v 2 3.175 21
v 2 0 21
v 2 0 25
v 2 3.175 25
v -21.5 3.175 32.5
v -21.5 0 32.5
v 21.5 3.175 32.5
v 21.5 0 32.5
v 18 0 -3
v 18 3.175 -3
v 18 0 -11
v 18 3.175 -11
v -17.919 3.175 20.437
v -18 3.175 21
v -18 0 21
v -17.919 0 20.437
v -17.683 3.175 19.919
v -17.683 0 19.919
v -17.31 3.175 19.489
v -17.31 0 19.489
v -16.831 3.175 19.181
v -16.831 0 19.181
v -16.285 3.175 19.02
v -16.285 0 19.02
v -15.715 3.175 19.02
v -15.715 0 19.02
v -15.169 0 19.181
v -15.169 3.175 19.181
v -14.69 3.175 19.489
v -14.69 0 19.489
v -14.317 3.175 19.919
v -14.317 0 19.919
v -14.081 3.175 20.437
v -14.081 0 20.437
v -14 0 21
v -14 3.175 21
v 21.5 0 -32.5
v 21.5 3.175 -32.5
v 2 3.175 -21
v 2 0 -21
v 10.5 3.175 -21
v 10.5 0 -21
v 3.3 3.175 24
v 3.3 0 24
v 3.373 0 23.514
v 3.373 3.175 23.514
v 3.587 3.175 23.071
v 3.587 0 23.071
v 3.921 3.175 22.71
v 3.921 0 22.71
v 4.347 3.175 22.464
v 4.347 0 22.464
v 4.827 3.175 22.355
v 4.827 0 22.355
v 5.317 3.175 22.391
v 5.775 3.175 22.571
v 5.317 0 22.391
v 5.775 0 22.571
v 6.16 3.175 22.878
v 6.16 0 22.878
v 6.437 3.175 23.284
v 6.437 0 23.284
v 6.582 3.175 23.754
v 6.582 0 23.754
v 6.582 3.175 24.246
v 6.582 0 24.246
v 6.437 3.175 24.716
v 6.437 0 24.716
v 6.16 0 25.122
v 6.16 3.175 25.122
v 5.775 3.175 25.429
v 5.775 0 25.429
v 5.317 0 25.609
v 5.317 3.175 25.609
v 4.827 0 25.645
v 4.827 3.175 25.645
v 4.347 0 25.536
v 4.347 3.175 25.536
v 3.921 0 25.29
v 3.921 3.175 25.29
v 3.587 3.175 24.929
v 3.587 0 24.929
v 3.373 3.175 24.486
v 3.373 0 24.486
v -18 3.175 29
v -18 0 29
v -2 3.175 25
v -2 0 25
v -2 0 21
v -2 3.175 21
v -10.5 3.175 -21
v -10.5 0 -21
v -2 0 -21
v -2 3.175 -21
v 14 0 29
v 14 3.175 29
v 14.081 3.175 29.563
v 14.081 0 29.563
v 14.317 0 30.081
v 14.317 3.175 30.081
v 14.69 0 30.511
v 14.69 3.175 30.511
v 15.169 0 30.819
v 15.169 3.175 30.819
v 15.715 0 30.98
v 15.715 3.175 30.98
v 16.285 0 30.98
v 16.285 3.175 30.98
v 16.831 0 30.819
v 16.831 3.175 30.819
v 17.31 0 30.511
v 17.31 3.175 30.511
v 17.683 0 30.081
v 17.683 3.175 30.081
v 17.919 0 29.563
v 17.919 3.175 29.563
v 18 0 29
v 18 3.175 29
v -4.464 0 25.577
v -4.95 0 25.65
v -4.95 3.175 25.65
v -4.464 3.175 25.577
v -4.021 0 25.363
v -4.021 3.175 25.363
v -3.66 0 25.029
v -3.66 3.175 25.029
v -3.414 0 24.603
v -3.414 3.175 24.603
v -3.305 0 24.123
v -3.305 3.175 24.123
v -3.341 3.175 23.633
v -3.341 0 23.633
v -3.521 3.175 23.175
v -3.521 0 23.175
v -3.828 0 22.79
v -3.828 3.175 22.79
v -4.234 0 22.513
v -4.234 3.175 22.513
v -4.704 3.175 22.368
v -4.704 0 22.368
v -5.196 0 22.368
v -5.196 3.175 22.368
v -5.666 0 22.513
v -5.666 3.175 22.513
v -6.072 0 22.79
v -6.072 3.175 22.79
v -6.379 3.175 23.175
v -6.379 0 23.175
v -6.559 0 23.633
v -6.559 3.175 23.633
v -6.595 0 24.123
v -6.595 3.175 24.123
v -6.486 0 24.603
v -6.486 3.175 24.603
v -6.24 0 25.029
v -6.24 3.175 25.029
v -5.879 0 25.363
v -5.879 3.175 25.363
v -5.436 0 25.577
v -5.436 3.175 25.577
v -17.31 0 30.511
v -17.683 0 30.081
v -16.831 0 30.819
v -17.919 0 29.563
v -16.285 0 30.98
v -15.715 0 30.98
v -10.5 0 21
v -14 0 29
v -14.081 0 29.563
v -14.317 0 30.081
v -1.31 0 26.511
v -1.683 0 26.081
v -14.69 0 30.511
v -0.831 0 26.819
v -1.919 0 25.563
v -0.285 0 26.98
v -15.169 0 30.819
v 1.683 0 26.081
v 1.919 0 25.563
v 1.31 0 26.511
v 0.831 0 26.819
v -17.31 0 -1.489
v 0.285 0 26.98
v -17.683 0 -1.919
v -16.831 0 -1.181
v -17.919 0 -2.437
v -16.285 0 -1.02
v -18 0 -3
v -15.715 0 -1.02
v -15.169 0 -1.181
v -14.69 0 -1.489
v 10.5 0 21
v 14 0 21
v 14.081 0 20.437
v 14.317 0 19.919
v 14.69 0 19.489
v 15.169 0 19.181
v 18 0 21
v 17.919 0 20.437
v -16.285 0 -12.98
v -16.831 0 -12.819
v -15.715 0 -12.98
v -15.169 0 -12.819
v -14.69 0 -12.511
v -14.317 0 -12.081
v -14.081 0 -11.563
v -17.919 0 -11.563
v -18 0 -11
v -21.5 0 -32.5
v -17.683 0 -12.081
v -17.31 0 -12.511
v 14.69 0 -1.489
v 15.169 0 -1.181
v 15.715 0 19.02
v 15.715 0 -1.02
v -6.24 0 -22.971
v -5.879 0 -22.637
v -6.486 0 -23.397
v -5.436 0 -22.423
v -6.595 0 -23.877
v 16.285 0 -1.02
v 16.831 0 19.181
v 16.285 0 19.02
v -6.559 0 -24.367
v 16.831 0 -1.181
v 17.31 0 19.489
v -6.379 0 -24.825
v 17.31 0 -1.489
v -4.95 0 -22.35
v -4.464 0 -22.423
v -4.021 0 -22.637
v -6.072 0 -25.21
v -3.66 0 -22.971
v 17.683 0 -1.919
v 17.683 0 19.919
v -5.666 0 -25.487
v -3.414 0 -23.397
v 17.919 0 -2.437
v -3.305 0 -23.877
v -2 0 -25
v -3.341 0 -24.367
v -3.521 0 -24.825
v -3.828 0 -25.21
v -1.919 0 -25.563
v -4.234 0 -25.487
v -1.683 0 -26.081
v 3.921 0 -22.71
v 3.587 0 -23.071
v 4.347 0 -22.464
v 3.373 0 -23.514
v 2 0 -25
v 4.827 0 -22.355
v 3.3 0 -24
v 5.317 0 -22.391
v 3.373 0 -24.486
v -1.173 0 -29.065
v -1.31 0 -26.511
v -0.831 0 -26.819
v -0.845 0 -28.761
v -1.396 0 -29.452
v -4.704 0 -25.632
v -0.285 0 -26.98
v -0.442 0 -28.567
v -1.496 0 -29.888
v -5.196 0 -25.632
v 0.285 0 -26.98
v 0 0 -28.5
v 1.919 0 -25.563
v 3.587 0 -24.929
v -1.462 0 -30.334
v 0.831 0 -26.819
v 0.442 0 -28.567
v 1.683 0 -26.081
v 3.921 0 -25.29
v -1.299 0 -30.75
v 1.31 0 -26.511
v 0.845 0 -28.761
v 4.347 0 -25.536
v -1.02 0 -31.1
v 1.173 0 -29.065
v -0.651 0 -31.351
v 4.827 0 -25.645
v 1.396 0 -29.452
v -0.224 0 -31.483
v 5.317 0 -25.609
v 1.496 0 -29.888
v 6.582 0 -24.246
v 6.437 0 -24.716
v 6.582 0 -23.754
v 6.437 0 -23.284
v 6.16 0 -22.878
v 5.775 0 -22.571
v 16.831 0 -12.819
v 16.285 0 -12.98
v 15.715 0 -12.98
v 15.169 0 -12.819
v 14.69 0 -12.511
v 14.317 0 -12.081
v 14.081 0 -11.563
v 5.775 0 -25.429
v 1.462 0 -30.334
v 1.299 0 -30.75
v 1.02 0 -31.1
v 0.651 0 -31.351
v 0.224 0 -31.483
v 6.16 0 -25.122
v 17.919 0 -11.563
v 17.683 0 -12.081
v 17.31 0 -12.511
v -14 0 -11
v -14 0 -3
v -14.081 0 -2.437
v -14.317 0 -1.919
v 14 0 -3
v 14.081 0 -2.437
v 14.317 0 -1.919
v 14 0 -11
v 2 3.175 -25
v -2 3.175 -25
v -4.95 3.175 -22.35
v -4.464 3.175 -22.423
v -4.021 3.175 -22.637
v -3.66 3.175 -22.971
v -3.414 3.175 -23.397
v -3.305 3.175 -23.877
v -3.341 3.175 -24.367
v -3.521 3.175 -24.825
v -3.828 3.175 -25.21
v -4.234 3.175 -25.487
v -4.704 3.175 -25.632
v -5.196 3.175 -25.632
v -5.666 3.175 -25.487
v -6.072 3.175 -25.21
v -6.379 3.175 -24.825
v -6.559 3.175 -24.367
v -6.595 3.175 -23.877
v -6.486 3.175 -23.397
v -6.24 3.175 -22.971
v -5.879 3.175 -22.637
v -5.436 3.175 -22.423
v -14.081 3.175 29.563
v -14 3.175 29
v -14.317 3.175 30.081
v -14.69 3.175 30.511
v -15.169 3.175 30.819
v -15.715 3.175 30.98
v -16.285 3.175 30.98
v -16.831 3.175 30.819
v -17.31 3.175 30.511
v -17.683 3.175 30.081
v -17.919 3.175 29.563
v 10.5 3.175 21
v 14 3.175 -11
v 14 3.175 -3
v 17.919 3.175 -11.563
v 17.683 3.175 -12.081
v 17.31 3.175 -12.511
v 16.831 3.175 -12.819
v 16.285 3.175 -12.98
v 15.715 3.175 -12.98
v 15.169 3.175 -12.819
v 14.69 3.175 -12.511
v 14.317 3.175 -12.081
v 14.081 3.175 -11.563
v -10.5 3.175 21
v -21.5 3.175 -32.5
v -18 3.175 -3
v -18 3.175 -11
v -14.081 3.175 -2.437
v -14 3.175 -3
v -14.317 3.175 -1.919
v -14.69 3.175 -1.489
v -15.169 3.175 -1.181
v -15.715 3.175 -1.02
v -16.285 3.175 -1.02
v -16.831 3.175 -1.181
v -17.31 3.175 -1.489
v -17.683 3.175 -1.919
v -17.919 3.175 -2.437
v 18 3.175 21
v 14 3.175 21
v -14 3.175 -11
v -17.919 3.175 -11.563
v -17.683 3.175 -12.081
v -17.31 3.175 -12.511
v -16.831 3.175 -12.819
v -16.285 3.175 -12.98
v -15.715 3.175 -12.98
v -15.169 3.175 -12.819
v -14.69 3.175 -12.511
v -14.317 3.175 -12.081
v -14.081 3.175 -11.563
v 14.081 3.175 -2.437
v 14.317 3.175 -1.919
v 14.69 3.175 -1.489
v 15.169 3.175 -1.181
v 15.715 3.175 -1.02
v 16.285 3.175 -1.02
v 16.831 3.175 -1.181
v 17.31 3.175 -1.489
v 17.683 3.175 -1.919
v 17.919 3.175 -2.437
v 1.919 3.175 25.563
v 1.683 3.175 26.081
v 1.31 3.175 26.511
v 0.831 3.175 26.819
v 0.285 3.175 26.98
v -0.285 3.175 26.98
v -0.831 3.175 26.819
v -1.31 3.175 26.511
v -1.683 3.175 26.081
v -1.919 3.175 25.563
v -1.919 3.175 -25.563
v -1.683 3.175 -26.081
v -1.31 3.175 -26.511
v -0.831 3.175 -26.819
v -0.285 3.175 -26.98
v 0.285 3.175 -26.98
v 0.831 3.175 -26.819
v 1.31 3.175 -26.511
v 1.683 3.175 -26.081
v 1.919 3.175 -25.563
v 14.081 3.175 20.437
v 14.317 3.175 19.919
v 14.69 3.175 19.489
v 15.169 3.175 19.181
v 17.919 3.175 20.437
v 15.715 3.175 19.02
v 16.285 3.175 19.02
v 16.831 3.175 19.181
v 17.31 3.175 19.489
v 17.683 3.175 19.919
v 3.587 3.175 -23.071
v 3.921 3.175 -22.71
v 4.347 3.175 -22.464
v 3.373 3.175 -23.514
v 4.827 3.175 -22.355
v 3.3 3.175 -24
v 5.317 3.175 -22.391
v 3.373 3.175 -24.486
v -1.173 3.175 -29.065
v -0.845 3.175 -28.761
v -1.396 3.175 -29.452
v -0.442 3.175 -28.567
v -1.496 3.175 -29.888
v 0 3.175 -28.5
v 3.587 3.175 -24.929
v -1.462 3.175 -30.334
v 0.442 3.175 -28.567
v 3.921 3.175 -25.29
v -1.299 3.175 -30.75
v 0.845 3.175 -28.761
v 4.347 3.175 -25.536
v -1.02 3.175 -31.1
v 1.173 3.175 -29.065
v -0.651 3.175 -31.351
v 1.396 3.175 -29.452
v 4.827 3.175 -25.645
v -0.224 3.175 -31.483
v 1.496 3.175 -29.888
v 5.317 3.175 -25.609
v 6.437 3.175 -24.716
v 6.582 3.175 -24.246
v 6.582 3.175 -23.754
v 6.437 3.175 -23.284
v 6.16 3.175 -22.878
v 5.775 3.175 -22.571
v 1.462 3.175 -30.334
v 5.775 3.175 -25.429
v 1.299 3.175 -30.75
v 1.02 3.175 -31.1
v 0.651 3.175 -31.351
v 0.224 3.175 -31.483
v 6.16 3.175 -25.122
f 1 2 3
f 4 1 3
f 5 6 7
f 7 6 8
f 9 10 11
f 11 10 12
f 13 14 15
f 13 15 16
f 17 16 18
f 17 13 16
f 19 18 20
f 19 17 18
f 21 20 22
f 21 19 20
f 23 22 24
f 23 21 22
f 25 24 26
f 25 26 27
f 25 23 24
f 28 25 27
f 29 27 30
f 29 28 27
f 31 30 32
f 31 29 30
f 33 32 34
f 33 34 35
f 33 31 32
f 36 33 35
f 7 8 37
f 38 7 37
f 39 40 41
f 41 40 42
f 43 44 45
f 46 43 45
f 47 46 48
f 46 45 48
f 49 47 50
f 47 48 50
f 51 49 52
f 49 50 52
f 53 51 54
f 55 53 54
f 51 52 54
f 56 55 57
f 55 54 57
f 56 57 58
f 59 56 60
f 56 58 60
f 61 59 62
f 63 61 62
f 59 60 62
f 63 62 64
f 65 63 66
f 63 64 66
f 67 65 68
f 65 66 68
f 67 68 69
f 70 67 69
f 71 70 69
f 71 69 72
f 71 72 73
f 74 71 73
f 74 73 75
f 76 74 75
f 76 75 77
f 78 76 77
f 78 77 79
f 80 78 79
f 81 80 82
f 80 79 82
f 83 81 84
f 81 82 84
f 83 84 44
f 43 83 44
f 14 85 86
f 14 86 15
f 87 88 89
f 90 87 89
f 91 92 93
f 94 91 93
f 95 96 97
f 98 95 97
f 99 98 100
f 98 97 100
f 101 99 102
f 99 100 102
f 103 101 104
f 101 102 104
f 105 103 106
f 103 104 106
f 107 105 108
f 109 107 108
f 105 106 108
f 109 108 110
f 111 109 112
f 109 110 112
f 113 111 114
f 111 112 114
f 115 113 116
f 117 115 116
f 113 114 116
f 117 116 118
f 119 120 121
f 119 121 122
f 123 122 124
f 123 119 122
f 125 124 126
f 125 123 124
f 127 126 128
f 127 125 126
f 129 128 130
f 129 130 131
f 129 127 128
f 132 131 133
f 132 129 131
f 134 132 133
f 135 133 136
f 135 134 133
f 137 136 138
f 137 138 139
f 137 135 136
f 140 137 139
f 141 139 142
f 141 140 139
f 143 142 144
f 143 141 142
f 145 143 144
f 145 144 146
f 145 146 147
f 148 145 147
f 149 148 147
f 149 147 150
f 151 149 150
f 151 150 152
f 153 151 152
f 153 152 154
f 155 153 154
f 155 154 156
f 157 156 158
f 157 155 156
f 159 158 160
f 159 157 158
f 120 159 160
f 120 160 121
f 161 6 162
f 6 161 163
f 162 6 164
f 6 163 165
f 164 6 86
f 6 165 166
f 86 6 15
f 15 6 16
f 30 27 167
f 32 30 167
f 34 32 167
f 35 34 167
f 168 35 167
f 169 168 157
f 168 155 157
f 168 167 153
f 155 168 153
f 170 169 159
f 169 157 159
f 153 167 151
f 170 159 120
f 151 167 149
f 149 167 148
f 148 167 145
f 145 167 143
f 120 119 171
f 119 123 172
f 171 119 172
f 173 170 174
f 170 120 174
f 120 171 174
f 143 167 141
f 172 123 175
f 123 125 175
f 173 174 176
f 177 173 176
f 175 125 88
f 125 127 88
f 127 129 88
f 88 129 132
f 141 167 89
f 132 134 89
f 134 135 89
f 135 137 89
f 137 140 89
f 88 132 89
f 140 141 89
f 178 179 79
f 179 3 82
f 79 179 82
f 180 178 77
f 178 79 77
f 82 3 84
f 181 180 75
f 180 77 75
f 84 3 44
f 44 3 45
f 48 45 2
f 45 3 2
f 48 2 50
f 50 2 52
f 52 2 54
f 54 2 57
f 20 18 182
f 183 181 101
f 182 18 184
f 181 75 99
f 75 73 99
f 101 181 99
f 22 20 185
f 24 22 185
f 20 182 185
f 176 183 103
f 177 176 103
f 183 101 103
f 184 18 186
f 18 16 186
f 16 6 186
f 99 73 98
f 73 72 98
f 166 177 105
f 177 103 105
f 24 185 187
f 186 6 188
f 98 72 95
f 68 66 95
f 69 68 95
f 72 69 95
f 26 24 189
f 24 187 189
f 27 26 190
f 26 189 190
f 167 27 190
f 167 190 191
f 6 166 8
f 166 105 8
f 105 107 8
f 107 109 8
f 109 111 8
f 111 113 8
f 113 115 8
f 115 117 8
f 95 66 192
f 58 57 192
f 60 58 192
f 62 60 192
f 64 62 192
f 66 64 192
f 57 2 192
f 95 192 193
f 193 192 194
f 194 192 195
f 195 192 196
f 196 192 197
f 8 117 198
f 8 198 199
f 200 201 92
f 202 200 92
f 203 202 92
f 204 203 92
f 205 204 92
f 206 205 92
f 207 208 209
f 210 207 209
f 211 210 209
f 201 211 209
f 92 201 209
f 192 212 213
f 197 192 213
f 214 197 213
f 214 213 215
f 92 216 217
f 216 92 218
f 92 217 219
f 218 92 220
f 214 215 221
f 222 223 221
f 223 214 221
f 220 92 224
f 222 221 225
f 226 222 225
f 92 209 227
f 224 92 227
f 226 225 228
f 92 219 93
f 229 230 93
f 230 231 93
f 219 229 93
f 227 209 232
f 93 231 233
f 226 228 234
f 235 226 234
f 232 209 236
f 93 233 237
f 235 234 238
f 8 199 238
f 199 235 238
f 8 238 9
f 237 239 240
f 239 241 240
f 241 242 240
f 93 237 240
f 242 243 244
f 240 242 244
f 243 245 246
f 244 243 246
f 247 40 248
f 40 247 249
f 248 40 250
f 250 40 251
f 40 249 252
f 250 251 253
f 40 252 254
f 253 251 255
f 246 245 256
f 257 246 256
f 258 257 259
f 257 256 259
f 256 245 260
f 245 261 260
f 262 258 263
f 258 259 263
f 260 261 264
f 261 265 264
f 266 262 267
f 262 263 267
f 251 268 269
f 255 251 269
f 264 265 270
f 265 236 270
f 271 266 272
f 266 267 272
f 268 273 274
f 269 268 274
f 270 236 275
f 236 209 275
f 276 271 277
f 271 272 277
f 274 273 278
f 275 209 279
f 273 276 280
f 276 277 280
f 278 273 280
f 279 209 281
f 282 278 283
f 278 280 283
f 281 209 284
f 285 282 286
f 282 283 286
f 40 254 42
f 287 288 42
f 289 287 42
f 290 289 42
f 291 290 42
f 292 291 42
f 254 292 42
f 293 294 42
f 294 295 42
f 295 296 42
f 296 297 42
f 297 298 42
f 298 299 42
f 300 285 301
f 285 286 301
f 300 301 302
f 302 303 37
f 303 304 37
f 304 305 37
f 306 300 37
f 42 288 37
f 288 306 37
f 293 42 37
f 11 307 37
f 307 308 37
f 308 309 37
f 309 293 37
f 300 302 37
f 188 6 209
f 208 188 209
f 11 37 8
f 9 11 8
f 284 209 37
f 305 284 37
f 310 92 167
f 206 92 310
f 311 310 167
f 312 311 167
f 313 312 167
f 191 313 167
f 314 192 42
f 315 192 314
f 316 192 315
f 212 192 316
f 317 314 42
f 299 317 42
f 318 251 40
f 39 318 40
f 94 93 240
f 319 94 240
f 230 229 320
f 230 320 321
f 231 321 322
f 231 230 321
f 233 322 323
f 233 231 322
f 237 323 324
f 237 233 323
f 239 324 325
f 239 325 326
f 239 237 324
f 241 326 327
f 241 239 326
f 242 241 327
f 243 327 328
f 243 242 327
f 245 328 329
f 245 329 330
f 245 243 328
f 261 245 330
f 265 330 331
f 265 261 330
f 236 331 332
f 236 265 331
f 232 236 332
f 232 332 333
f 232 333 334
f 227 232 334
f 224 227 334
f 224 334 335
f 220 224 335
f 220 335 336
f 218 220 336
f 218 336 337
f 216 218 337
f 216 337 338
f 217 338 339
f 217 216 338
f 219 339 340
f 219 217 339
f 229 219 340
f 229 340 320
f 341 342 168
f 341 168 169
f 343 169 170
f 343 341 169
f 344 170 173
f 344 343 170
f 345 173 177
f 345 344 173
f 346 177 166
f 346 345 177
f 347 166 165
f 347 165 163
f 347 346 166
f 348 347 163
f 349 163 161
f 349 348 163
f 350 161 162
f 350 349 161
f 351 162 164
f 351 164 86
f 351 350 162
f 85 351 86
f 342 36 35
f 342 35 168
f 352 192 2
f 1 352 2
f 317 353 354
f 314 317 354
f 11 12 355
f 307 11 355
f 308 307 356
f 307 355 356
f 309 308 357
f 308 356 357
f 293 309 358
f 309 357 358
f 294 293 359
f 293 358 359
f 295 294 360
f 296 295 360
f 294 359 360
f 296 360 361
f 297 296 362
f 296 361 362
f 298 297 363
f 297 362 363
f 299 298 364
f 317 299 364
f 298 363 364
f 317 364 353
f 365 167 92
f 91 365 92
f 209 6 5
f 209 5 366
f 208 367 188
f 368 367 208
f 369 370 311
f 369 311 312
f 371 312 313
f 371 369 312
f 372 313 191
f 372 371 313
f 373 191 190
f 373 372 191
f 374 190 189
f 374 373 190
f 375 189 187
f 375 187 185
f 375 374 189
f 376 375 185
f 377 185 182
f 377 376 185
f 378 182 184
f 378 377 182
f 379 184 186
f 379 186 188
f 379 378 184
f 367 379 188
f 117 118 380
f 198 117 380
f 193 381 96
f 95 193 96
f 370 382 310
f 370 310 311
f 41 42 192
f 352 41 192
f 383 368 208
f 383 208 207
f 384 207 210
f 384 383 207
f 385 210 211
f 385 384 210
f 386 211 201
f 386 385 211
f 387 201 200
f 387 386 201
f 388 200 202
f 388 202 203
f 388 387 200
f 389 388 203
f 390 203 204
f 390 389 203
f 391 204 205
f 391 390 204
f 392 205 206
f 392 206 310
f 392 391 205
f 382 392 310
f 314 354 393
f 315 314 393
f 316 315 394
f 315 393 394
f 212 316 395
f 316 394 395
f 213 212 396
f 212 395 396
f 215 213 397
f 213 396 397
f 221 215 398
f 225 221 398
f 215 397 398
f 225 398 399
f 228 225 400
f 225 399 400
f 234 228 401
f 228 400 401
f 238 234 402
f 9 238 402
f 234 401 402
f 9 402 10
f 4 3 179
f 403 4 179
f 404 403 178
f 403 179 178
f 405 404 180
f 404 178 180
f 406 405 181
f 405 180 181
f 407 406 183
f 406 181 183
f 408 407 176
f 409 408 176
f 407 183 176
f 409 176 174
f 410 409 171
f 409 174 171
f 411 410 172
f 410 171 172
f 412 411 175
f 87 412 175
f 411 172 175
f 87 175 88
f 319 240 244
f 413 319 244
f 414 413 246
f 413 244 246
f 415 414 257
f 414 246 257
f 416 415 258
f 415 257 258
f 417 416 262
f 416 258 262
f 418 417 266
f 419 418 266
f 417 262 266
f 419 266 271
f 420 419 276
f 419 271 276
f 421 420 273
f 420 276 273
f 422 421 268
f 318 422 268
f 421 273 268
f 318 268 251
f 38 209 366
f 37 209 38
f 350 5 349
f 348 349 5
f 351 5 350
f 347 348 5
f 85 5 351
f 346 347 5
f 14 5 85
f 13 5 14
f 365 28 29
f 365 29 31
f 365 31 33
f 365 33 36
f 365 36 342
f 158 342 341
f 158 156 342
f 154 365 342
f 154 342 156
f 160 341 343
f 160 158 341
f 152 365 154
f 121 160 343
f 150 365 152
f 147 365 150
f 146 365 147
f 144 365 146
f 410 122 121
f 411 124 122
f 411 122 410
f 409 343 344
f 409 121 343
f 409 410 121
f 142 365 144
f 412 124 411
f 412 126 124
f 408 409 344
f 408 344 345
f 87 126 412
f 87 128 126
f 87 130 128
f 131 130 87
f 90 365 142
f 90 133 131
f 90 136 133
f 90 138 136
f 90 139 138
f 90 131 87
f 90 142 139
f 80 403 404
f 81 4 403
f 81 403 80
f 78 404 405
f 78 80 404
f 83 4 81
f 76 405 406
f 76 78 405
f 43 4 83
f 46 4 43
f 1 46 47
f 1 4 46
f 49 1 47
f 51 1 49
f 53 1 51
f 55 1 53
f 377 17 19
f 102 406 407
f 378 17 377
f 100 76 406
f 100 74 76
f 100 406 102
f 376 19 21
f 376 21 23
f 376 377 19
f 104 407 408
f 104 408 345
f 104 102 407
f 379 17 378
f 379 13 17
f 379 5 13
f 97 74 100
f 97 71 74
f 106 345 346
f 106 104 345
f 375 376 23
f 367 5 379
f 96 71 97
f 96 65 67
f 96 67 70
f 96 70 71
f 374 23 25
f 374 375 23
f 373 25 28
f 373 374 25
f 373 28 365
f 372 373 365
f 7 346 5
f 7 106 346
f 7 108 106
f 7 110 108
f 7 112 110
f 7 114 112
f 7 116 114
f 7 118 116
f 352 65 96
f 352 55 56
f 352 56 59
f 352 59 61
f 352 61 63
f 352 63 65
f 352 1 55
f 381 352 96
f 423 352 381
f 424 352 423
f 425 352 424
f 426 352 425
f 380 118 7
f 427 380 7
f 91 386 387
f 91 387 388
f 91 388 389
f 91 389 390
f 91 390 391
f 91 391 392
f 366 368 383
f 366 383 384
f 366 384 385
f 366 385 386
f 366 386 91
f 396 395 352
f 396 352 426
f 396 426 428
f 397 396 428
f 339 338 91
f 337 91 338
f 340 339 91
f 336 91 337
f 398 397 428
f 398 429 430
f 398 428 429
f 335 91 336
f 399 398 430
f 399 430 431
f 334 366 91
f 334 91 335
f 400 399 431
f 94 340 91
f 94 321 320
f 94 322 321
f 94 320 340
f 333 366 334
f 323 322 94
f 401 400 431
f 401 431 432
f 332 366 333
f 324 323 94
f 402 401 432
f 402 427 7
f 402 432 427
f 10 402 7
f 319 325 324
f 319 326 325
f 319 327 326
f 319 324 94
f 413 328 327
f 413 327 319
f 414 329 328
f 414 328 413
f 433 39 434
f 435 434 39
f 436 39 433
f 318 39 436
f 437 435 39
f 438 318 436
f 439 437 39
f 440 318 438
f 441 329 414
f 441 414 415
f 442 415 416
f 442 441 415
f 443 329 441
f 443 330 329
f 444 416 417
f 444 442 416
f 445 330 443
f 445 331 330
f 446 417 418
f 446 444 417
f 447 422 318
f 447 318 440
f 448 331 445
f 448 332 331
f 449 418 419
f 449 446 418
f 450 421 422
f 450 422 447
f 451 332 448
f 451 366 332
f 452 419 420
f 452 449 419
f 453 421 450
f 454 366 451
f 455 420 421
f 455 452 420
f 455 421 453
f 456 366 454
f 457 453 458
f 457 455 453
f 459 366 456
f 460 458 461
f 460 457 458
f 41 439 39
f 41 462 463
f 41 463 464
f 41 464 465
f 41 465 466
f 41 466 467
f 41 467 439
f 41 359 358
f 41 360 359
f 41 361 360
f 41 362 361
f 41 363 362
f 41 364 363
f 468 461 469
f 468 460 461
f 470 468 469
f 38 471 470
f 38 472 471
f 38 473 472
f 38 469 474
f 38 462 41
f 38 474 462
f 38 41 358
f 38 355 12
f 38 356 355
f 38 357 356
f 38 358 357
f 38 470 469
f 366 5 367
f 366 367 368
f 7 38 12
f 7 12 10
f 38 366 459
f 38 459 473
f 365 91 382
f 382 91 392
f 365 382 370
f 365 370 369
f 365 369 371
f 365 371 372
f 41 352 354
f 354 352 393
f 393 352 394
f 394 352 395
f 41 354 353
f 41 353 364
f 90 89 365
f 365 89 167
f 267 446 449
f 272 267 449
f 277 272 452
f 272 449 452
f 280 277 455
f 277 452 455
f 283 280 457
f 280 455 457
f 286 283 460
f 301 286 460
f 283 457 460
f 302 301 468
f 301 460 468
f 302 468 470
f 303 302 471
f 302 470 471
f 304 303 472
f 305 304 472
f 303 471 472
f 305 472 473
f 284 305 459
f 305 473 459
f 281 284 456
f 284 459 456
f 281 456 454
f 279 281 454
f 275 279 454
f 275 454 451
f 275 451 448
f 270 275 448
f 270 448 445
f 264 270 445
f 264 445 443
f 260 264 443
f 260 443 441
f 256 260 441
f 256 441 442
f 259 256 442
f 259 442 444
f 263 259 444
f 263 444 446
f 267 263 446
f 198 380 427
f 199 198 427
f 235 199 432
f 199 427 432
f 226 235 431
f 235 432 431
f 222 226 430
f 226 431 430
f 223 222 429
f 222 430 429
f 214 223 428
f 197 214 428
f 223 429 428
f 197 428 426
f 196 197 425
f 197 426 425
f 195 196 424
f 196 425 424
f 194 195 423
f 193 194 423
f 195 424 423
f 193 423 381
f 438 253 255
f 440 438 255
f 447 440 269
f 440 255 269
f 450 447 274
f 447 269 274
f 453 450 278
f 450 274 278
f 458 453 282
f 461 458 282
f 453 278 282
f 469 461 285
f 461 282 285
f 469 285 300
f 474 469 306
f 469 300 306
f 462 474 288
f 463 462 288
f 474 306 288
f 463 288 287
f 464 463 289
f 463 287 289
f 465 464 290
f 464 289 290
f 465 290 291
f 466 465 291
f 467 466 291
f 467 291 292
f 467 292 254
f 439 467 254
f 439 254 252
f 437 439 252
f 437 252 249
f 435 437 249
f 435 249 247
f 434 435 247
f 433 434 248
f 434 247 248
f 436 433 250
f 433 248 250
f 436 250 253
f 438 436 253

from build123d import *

# Parameters (mm, degrees)
SKETCH1_W           = 43
SKETCH1_H           = 65
SKETCH1_R           = 1.65
BOSS_EXTRUDE1_DEPTH = 3.175
CUT_EXTRUDE1_DEPTH  = 3.175
SKETCH4_R           = 1.5
CUT_EXTRUDE2_DEPTH  = 10


with BuildPart() as part:
    # Sketch1 → Boss-Extrude1 (new body)
    with BuildSketch(Plane(origin=(0, 0, 0), x_dir=(1, 0, 0), z_dir=(0, 1, 0))):
        Rectangle(SKETCH1_W, SKETCH1_H)
        with Locations(Location((-4.95, -24, 0), (0, 0, 270))):
            Circle(SKETCH1_R, mode=Mode.SUBTRACT)
        with BuildLine():
            Line((-10.5, 21), (-2, 21))
            Line((-2, 21), (-2, 24))
            Line((-2, 24), (-2, 25))
            ThreePointArc((-2, 25), (0, 27), (2, 25))
            Line((2, 25), (2, 24))
            Line((2, 24), (2, 21))
            Line((2, 21), (10.5, 21))
            Line((10.5, 21), (10.5, 0))
            Line((10.5, 0), (10.5, -21))
            Line((10.5, -21), (2, -21))
            Line((2, -21), (2, -24))
            Line((2, -24), (2, -25))
            ThreePointArc((2, -25), (0, -27), (-2, -25))
            Line((-2, -25), (-2, -24))
            Line((-2, -24), (-2, -21))
            Line((-2, -21), (-10.5, -21))
            Line((-10.5, -21), (-10.5, 0))
            Line((-10.5, 0), (-10.5, 21))
        make_face(mode=Mode.SUBTRACT)
        with BuildLine():
            ThreePointArc((6.6, -24), (4.95, -25.65), (3.3, -24))
            ThreePointArc((3.3, -24), (4.95, -22.35), (6.6, -24))
        make_face(mode=Mode.SUBTRACT)
        with Locations(Location((-4.95, 24, 0), (0, 0, 270))):
            Circle(SKETCH1_R, mode=Mode.SUBTRACT)
        with BuildLine():
            ThreePointArc((6.6, 24), (4.95, 22.35), (3.3, 24))
            ThreePointArc((3.3, 24), (4.95, 25.65), (6.6, 24))
        make_face(mode=Mode.SUBTRACT)
    extrude(amount=BOSS_EXTRUDE1_DEPTH)

    # Sketch3 → Cut-Extrude1 (cut)
    with BuildSketch(Plane(origin=(0, 3.175, 0), x_dir=(1, 0, 0), z_dir=(0, 1, 0))):
        with BuildLine():
            Line((-14, -21), (-14, -29))
            ThreePointArc((-14, -29), (-16, -31), (-18, -29))
            Line((-18, -29), (-18, -21))
            ThreePointArc((-18, -21), (-16, -19), (-14, -21))
        make_face()
        with BuildLine():
            Line((14, -21), (14, -29))
            ThreePointArc((14, -29), (16, -31), (18, -29))
            Line((18, -29), (18, -21))
            ThreePointArc((18, -21), (16, -19), (14, -21))
        make_face()
        with BuildLine():
            Line((-14, 11), (-14, 3))
            ThreePointArc((-14, 3), (-16, 1), (-18, 3))
            Line((-18, 3), (-18, 11))
            ThreePointArc((-18, 11), (-16, 13), (-14, 11))
        make_face()
        with BuildLine():
            Line((14, 11), (14, 3))
            ThreePointArc((14, 3), (16, 1), (18, 3))
            Line((18, 3), (18, 11))
            ThreePointArc((18, 11), (16, 13), (14, 11))
        make_face()
    extrude(amount=-CUT_EXTRUDE1_DEPTH, mode=Mode.SUBTRACT)

    # Sketch4 → Cut-Extrude2 (cut)
    with BuildSketch(Plane(origin=(0, 3.175, 0), x_dir=(1, 0, 0), z_dir=(0, 1, 0))):
        with Locations(Location((0, 30, 0), (0, 0, 270))):
            Circle(SKETCH4_R)
    extrude(amount=-CUT_EXTRUDE2_DEPTH, mode=Mode.SUBTRACT)


solid = part.part
